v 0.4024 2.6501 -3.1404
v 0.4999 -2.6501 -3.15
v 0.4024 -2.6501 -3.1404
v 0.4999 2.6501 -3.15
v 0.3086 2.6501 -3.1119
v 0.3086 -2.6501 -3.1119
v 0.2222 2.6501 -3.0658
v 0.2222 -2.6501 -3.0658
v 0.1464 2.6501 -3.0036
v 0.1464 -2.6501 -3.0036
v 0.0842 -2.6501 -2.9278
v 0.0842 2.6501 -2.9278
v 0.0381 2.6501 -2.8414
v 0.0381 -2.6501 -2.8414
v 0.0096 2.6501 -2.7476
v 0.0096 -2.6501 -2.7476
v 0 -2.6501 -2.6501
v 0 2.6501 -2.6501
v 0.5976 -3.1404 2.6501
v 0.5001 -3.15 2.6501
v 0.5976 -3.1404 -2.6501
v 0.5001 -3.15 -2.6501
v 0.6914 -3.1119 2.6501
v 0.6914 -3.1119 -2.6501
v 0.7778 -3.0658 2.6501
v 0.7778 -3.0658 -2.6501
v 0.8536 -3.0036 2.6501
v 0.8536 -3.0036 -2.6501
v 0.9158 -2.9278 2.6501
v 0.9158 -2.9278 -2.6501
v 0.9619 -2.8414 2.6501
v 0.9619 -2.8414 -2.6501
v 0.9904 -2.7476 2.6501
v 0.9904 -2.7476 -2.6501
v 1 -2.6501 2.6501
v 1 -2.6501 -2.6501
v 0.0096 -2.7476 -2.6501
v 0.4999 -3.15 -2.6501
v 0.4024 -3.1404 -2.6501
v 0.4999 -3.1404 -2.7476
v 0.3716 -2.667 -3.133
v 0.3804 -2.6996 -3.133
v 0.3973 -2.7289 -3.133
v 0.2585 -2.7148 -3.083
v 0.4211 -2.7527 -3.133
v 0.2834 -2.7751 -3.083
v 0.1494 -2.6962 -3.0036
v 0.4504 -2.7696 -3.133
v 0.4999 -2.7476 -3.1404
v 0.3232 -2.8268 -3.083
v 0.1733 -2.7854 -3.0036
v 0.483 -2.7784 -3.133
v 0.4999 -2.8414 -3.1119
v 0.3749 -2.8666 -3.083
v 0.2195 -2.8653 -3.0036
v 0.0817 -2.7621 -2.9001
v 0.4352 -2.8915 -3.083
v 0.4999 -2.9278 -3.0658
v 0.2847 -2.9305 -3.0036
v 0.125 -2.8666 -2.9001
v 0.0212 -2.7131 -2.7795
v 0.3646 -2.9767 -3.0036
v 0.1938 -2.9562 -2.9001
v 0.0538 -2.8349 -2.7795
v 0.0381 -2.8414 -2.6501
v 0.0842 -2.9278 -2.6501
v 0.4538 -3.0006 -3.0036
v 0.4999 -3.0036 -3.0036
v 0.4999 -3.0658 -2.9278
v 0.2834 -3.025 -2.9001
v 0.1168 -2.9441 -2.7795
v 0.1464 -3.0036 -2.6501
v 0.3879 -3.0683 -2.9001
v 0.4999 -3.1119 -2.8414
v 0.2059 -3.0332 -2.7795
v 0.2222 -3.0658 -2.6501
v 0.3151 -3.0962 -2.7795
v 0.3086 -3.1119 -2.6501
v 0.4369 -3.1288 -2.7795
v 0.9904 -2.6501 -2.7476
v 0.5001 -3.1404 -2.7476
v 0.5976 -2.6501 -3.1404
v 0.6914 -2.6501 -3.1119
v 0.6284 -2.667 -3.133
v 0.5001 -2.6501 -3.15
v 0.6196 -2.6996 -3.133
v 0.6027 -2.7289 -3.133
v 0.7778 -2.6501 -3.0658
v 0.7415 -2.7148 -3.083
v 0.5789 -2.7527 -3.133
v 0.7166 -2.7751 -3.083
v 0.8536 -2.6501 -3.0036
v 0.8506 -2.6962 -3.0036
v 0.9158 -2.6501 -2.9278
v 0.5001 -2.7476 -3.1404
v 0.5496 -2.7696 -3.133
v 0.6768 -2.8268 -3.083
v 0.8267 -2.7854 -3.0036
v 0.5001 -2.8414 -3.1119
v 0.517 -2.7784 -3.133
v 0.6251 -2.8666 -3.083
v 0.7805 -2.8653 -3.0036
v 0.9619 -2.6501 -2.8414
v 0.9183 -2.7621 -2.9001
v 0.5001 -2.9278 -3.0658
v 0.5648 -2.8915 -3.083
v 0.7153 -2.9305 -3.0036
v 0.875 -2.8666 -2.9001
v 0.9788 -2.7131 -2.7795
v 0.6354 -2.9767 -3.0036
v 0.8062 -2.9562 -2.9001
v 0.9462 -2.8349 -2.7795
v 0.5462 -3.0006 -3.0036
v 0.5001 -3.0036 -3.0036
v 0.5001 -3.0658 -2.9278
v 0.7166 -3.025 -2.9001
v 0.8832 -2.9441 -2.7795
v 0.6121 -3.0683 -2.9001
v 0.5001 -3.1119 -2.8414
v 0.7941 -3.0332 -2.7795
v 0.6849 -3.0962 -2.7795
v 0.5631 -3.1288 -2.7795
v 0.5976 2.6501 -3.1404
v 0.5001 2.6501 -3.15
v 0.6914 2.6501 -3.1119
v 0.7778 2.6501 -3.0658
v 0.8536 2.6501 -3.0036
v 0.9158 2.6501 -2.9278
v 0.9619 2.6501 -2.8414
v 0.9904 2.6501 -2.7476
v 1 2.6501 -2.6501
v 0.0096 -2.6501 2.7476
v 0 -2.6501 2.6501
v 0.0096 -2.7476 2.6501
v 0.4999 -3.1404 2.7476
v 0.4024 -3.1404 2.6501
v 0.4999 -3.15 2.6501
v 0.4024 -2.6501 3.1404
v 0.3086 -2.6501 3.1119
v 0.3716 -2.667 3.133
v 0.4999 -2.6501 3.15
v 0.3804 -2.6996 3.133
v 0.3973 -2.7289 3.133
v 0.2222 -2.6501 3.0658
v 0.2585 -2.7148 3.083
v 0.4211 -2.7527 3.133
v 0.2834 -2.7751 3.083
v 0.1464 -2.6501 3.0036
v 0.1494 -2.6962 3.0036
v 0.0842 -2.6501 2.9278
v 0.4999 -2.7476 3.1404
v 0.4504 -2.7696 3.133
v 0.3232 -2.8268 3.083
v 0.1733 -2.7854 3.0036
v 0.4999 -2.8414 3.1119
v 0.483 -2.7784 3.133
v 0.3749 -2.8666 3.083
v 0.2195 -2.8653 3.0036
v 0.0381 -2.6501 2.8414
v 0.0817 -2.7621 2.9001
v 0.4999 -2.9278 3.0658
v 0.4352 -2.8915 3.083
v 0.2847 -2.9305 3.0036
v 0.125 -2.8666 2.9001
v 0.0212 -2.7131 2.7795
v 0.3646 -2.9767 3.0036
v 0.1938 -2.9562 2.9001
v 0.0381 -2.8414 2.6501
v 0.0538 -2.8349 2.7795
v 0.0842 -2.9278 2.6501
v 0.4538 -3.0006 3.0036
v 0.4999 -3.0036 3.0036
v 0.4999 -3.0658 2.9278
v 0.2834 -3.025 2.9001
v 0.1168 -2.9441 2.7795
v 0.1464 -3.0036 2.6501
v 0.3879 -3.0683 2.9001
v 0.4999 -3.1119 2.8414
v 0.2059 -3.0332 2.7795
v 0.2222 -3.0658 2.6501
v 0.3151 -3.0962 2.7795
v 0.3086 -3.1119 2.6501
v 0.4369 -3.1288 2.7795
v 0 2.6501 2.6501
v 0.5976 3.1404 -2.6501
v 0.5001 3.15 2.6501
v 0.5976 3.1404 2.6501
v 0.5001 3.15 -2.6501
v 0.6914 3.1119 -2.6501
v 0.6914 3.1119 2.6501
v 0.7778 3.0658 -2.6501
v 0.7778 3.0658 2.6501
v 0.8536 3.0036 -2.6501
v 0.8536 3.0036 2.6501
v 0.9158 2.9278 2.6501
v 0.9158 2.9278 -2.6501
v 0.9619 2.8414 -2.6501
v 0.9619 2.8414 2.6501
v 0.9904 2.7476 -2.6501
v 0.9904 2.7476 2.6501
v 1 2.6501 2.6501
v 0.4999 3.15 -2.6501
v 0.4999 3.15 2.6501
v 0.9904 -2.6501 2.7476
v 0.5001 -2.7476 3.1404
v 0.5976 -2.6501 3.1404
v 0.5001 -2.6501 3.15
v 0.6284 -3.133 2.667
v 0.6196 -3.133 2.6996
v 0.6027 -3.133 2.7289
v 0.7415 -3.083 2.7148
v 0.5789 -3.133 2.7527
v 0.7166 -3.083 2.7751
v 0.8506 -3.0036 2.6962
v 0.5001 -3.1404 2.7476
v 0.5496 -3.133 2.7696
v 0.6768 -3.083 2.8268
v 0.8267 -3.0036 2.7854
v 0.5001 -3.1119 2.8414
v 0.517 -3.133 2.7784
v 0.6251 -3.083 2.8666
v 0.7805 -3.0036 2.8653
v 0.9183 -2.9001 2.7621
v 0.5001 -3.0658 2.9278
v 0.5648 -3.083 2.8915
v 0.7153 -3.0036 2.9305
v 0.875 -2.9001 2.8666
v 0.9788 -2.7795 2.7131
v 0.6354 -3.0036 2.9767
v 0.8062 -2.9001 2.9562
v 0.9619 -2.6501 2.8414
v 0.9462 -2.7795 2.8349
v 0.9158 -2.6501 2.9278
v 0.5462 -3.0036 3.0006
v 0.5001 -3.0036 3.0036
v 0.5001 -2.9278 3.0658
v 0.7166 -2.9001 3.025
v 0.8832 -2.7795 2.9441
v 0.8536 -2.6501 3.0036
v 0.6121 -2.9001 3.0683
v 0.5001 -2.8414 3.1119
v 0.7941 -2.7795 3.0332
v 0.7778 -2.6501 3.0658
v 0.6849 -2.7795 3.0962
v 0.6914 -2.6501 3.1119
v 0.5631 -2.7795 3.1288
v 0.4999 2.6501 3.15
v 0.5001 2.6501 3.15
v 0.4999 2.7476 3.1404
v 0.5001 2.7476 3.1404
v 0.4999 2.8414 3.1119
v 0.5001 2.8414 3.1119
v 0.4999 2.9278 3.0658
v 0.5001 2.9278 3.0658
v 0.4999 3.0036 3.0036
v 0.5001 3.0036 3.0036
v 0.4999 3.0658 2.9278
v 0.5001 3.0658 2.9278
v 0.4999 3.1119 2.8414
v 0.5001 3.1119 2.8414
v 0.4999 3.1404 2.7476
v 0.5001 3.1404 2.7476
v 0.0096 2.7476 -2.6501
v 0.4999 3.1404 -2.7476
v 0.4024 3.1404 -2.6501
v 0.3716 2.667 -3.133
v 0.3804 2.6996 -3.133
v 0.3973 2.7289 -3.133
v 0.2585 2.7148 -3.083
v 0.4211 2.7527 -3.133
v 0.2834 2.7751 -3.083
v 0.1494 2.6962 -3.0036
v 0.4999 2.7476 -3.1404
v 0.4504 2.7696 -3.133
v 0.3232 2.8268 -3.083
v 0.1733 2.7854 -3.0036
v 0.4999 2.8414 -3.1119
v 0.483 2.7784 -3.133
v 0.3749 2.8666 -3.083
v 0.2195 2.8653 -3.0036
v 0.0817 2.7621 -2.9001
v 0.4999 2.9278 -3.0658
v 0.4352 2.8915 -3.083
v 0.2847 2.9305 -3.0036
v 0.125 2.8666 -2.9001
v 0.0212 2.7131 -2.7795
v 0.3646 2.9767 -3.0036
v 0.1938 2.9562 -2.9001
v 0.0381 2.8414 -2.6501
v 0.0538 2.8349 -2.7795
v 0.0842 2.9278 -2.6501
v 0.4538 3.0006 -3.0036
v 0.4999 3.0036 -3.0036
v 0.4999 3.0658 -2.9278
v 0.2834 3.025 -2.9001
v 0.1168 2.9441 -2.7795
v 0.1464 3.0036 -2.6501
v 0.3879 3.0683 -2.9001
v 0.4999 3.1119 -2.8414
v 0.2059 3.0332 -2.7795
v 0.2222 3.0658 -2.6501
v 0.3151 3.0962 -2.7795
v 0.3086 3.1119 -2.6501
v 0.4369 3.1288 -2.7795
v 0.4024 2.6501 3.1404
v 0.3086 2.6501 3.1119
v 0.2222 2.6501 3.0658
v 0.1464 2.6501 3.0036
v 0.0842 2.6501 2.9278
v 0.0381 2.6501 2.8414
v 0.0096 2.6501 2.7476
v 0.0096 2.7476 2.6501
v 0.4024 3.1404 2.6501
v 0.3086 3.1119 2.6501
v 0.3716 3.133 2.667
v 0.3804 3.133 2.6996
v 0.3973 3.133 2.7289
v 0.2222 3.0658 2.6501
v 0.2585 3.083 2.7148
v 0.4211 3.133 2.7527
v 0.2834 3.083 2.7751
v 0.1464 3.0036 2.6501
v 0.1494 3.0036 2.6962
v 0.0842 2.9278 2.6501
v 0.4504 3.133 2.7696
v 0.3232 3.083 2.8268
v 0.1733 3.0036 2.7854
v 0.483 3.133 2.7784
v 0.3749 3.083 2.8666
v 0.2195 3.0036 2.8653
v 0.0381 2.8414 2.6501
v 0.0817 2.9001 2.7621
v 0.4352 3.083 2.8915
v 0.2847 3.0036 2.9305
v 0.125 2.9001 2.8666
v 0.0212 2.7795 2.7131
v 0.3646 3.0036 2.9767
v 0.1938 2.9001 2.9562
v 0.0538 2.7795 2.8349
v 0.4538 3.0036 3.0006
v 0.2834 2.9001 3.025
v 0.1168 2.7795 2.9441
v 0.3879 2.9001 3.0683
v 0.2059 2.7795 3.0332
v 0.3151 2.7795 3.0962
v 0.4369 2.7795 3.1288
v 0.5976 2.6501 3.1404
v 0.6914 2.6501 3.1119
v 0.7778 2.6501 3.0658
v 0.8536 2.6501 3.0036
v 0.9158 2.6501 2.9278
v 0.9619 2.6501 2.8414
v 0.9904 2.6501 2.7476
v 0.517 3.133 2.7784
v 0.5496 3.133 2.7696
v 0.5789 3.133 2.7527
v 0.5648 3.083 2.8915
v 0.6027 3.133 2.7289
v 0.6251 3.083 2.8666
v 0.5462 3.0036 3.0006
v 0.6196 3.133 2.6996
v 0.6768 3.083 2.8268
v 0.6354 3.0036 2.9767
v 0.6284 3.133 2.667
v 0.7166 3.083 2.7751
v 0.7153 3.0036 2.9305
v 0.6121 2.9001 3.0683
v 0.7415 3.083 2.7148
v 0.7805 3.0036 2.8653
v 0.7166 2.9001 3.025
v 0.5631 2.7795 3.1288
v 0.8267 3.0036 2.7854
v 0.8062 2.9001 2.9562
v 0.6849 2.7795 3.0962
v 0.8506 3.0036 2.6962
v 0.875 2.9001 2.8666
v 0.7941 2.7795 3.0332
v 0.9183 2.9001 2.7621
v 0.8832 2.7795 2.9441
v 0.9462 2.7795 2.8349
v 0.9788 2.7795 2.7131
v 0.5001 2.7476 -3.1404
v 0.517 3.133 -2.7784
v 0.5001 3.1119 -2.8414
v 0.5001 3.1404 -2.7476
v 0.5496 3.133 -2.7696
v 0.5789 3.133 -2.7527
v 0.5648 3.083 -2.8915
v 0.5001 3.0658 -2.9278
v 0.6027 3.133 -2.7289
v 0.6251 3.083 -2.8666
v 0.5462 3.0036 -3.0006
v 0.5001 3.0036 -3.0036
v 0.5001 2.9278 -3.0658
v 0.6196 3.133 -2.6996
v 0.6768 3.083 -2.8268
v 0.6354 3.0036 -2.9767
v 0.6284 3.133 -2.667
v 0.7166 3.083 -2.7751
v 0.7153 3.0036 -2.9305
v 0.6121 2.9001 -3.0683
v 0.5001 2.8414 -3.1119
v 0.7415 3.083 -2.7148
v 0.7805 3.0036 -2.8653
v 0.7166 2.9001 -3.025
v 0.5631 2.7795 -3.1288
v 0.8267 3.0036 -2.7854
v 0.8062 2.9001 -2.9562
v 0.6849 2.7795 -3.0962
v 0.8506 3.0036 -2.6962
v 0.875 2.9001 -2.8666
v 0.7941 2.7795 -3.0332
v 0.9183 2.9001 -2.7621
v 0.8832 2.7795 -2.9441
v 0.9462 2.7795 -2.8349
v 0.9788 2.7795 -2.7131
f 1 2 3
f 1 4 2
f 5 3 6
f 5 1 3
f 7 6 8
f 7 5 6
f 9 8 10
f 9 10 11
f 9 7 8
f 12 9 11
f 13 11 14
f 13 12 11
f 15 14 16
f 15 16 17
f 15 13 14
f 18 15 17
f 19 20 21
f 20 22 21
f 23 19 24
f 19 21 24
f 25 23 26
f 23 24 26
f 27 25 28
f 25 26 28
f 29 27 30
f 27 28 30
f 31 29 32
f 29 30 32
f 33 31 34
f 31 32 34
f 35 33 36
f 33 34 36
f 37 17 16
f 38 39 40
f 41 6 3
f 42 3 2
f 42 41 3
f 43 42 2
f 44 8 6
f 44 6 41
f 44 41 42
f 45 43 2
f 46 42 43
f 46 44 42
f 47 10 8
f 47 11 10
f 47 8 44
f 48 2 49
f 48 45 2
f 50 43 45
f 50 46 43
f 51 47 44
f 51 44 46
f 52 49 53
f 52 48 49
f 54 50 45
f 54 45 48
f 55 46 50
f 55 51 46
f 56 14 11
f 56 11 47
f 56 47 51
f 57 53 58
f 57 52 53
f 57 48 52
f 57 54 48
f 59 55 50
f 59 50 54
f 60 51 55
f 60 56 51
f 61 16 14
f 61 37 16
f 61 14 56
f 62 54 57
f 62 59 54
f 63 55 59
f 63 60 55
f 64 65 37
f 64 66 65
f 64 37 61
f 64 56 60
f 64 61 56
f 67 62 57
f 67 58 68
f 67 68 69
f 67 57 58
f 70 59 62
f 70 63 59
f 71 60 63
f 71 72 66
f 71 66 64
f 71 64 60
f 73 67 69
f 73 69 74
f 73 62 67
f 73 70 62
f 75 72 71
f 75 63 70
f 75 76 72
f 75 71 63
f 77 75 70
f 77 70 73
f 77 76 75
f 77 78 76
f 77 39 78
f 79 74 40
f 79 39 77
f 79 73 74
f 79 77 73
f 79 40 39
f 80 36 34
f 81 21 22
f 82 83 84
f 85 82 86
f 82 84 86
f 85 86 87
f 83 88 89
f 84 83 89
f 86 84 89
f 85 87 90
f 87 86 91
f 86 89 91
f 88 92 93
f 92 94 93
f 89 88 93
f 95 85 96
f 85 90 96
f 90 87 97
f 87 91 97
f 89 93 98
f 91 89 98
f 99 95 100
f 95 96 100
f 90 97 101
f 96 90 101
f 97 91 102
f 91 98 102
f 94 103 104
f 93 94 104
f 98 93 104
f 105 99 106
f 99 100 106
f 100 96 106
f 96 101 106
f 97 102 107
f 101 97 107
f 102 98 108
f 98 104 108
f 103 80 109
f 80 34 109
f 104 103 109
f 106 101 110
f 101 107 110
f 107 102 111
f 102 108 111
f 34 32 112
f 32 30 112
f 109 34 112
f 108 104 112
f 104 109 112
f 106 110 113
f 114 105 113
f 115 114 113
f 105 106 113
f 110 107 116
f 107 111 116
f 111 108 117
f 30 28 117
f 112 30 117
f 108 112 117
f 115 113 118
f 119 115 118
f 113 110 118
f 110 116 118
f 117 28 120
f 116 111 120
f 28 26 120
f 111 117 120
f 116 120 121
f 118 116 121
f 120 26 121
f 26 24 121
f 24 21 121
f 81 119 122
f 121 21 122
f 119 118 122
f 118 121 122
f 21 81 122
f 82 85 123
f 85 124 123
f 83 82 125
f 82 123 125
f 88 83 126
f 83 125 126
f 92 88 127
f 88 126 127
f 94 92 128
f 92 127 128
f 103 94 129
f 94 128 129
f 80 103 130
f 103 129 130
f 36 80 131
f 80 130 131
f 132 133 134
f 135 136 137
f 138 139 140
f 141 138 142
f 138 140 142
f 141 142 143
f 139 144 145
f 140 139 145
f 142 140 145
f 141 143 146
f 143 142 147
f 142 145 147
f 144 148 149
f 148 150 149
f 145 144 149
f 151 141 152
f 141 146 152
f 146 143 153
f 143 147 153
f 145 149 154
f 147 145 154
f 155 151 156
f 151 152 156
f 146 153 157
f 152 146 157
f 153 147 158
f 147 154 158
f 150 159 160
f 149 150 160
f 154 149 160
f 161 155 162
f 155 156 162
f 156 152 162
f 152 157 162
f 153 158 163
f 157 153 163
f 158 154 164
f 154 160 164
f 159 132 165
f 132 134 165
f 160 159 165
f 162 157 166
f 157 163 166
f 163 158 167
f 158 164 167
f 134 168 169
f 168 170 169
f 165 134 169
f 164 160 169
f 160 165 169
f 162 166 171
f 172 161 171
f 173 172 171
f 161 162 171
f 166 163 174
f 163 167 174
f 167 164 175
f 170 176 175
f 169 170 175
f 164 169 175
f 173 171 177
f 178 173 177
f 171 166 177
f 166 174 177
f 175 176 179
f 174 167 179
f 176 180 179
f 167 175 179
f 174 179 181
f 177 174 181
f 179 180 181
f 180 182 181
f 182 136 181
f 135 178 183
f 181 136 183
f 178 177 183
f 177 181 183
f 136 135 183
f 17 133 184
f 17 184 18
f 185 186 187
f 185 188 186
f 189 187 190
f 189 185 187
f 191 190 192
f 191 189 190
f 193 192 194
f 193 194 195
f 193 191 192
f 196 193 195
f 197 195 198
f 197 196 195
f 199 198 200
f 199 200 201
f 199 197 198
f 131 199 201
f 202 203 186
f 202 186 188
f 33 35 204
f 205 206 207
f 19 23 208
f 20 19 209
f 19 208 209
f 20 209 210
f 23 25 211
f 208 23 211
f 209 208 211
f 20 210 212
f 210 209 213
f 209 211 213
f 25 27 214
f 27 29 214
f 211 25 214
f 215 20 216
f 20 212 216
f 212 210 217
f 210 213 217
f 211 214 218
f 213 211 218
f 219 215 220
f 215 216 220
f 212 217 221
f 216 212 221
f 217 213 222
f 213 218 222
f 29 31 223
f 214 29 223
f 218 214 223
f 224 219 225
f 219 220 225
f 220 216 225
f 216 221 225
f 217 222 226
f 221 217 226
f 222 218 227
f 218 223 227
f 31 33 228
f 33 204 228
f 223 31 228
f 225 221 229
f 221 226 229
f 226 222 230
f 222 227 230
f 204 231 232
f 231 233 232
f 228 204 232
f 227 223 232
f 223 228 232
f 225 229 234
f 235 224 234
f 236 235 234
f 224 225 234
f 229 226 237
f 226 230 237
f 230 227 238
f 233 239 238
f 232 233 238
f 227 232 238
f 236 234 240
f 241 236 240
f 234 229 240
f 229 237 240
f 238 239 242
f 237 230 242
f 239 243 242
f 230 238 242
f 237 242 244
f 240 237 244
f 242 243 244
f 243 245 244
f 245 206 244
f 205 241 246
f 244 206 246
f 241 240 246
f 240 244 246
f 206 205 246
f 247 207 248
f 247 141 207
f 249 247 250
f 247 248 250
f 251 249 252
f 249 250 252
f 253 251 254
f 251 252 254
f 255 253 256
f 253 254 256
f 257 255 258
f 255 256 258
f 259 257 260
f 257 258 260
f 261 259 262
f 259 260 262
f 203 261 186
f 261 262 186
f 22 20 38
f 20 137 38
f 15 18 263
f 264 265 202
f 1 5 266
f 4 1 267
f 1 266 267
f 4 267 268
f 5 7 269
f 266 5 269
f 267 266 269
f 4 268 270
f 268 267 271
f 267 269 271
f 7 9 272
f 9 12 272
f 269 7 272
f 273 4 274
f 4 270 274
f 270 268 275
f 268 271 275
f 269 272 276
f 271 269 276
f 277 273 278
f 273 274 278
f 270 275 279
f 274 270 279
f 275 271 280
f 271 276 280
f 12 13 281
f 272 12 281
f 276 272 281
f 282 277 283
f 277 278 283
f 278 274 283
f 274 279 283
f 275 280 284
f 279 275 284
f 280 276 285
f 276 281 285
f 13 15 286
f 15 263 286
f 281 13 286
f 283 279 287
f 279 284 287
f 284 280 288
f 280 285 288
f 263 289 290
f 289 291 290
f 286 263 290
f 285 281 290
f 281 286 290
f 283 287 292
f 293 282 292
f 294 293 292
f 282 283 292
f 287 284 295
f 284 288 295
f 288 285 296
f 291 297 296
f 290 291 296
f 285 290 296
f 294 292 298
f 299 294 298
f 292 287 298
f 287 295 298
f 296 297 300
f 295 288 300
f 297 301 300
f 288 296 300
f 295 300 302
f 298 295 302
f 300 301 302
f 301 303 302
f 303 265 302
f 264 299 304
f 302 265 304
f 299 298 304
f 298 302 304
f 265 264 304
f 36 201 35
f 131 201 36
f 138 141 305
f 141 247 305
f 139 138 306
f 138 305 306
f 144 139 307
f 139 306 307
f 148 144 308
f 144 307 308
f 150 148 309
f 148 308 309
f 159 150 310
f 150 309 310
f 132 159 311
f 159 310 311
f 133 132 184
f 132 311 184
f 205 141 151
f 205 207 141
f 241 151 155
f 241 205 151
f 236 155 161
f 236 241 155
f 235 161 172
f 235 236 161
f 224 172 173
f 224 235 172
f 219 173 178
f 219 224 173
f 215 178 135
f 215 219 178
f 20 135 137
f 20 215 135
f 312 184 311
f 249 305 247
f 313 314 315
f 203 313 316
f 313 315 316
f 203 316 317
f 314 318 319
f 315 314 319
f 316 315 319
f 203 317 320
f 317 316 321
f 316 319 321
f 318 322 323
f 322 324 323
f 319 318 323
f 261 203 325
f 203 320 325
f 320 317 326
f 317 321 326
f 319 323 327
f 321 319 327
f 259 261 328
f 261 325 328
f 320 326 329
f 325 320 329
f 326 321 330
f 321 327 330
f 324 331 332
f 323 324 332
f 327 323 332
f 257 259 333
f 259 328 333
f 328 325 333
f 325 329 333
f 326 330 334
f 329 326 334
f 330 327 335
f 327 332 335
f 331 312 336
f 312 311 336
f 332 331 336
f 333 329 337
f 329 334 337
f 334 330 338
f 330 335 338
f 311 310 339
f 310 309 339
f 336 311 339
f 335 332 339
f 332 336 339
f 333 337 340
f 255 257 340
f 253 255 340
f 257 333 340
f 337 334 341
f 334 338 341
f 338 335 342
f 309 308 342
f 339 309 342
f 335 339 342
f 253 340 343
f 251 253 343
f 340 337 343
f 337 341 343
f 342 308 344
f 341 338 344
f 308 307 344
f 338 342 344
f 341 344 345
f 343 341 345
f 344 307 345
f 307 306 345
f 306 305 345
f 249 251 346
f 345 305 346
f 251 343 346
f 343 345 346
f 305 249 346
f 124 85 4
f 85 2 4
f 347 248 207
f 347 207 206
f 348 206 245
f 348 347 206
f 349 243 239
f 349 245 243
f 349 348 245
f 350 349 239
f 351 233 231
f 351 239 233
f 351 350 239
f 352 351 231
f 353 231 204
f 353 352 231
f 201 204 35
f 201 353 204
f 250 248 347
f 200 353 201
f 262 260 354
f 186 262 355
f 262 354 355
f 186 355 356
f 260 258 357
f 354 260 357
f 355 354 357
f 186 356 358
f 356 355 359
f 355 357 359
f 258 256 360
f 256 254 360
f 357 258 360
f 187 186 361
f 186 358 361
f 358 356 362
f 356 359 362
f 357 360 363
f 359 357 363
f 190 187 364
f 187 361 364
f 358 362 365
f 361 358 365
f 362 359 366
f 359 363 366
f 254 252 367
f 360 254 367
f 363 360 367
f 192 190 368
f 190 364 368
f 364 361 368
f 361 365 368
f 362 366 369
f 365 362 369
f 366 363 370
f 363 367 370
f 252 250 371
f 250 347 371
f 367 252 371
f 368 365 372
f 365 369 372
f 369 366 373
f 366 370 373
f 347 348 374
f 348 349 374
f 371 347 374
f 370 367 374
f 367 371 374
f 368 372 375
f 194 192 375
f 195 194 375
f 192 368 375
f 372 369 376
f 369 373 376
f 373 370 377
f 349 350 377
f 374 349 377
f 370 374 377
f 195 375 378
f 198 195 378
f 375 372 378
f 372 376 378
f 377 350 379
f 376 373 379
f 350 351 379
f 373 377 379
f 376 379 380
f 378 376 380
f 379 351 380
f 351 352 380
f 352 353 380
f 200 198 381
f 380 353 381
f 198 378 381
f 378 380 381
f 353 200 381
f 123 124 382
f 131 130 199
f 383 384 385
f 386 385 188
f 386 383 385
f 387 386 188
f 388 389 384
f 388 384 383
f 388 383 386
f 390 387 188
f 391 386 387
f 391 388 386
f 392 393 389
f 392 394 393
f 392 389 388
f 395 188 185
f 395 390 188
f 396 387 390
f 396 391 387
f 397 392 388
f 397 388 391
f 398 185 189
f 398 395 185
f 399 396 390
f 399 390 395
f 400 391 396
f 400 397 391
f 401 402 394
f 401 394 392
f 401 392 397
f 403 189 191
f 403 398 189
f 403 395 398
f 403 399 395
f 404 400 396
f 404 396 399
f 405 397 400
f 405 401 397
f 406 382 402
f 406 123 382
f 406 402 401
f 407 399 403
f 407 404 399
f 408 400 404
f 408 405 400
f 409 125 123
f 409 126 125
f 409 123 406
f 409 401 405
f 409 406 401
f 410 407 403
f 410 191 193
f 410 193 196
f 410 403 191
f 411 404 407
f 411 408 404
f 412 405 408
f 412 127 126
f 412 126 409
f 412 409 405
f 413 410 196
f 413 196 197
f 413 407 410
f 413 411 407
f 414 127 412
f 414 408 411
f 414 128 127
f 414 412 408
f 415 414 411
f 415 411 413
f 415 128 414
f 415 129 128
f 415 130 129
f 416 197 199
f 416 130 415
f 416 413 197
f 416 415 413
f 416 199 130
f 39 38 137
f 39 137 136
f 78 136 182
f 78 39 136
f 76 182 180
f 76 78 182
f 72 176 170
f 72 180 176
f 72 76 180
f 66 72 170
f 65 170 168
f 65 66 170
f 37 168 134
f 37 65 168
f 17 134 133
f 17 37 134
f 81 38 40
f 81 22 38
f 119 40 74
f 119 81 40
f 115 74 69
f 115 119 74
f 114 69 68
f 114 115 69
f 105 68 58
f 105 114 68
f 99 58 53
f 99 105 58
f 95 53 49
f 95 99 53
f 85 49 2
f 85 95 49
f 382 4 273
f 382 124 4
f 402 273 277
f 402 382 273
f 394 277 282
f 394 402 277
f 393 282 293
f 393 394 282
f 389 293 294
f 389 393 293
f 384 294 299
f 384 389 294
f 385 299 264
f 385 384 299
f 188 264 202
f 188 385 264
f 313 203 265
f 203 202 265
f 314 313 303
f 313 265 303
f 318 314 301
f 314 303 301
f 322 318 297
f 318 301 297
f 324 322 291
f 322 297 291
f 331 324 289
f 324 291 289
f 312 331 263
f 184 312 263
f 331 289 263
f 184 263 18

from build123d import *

# Parameters (mm, degrees)
SKETCH1_W           = 6.3
SKETCH1_H           = 6.3
BOSS_EXTRUDE1_DEPTH = 1
FILLET1_R           = 0.5


with BuildPart() as part:
    # Sketch1 → Boss-Extrude1 (new body)
    with BuildSketch(Plane(origin=(0, 0, 0), x_dir=(0, 0, -1), z_dir=(1, 0, 0))):
        Rectangle(SKETCH1_W, SKETCH1_H)
    extrude(amount=BOSS_EXTRUDE1_DEPTH)

    # Fillet1
    fillet1_edges = [part.edges().sort_by_distance(p)[0] for p in [
        (1, 0, 3.15),
        (1, -3.15, 0),
        (1, 0, -3.15),
        (0, -3.15, 0),
        (0, 0, 3.15),
        (0, 3.15, 0),
        (0, 0, -3.15),
        (0.5, -3.15, -3.15),
        (0.5, -3.15, 3.15),
        (0.5, 3.15, 3.15),
        (0.5, 3.15, -3.15),
        (1, 3.15, 0),
    ]]
    fillet(fillet1_edges, radius=FILLET1_R - 0.0001)  # a hair under: the kernel refuses the full size


solid = part.part
